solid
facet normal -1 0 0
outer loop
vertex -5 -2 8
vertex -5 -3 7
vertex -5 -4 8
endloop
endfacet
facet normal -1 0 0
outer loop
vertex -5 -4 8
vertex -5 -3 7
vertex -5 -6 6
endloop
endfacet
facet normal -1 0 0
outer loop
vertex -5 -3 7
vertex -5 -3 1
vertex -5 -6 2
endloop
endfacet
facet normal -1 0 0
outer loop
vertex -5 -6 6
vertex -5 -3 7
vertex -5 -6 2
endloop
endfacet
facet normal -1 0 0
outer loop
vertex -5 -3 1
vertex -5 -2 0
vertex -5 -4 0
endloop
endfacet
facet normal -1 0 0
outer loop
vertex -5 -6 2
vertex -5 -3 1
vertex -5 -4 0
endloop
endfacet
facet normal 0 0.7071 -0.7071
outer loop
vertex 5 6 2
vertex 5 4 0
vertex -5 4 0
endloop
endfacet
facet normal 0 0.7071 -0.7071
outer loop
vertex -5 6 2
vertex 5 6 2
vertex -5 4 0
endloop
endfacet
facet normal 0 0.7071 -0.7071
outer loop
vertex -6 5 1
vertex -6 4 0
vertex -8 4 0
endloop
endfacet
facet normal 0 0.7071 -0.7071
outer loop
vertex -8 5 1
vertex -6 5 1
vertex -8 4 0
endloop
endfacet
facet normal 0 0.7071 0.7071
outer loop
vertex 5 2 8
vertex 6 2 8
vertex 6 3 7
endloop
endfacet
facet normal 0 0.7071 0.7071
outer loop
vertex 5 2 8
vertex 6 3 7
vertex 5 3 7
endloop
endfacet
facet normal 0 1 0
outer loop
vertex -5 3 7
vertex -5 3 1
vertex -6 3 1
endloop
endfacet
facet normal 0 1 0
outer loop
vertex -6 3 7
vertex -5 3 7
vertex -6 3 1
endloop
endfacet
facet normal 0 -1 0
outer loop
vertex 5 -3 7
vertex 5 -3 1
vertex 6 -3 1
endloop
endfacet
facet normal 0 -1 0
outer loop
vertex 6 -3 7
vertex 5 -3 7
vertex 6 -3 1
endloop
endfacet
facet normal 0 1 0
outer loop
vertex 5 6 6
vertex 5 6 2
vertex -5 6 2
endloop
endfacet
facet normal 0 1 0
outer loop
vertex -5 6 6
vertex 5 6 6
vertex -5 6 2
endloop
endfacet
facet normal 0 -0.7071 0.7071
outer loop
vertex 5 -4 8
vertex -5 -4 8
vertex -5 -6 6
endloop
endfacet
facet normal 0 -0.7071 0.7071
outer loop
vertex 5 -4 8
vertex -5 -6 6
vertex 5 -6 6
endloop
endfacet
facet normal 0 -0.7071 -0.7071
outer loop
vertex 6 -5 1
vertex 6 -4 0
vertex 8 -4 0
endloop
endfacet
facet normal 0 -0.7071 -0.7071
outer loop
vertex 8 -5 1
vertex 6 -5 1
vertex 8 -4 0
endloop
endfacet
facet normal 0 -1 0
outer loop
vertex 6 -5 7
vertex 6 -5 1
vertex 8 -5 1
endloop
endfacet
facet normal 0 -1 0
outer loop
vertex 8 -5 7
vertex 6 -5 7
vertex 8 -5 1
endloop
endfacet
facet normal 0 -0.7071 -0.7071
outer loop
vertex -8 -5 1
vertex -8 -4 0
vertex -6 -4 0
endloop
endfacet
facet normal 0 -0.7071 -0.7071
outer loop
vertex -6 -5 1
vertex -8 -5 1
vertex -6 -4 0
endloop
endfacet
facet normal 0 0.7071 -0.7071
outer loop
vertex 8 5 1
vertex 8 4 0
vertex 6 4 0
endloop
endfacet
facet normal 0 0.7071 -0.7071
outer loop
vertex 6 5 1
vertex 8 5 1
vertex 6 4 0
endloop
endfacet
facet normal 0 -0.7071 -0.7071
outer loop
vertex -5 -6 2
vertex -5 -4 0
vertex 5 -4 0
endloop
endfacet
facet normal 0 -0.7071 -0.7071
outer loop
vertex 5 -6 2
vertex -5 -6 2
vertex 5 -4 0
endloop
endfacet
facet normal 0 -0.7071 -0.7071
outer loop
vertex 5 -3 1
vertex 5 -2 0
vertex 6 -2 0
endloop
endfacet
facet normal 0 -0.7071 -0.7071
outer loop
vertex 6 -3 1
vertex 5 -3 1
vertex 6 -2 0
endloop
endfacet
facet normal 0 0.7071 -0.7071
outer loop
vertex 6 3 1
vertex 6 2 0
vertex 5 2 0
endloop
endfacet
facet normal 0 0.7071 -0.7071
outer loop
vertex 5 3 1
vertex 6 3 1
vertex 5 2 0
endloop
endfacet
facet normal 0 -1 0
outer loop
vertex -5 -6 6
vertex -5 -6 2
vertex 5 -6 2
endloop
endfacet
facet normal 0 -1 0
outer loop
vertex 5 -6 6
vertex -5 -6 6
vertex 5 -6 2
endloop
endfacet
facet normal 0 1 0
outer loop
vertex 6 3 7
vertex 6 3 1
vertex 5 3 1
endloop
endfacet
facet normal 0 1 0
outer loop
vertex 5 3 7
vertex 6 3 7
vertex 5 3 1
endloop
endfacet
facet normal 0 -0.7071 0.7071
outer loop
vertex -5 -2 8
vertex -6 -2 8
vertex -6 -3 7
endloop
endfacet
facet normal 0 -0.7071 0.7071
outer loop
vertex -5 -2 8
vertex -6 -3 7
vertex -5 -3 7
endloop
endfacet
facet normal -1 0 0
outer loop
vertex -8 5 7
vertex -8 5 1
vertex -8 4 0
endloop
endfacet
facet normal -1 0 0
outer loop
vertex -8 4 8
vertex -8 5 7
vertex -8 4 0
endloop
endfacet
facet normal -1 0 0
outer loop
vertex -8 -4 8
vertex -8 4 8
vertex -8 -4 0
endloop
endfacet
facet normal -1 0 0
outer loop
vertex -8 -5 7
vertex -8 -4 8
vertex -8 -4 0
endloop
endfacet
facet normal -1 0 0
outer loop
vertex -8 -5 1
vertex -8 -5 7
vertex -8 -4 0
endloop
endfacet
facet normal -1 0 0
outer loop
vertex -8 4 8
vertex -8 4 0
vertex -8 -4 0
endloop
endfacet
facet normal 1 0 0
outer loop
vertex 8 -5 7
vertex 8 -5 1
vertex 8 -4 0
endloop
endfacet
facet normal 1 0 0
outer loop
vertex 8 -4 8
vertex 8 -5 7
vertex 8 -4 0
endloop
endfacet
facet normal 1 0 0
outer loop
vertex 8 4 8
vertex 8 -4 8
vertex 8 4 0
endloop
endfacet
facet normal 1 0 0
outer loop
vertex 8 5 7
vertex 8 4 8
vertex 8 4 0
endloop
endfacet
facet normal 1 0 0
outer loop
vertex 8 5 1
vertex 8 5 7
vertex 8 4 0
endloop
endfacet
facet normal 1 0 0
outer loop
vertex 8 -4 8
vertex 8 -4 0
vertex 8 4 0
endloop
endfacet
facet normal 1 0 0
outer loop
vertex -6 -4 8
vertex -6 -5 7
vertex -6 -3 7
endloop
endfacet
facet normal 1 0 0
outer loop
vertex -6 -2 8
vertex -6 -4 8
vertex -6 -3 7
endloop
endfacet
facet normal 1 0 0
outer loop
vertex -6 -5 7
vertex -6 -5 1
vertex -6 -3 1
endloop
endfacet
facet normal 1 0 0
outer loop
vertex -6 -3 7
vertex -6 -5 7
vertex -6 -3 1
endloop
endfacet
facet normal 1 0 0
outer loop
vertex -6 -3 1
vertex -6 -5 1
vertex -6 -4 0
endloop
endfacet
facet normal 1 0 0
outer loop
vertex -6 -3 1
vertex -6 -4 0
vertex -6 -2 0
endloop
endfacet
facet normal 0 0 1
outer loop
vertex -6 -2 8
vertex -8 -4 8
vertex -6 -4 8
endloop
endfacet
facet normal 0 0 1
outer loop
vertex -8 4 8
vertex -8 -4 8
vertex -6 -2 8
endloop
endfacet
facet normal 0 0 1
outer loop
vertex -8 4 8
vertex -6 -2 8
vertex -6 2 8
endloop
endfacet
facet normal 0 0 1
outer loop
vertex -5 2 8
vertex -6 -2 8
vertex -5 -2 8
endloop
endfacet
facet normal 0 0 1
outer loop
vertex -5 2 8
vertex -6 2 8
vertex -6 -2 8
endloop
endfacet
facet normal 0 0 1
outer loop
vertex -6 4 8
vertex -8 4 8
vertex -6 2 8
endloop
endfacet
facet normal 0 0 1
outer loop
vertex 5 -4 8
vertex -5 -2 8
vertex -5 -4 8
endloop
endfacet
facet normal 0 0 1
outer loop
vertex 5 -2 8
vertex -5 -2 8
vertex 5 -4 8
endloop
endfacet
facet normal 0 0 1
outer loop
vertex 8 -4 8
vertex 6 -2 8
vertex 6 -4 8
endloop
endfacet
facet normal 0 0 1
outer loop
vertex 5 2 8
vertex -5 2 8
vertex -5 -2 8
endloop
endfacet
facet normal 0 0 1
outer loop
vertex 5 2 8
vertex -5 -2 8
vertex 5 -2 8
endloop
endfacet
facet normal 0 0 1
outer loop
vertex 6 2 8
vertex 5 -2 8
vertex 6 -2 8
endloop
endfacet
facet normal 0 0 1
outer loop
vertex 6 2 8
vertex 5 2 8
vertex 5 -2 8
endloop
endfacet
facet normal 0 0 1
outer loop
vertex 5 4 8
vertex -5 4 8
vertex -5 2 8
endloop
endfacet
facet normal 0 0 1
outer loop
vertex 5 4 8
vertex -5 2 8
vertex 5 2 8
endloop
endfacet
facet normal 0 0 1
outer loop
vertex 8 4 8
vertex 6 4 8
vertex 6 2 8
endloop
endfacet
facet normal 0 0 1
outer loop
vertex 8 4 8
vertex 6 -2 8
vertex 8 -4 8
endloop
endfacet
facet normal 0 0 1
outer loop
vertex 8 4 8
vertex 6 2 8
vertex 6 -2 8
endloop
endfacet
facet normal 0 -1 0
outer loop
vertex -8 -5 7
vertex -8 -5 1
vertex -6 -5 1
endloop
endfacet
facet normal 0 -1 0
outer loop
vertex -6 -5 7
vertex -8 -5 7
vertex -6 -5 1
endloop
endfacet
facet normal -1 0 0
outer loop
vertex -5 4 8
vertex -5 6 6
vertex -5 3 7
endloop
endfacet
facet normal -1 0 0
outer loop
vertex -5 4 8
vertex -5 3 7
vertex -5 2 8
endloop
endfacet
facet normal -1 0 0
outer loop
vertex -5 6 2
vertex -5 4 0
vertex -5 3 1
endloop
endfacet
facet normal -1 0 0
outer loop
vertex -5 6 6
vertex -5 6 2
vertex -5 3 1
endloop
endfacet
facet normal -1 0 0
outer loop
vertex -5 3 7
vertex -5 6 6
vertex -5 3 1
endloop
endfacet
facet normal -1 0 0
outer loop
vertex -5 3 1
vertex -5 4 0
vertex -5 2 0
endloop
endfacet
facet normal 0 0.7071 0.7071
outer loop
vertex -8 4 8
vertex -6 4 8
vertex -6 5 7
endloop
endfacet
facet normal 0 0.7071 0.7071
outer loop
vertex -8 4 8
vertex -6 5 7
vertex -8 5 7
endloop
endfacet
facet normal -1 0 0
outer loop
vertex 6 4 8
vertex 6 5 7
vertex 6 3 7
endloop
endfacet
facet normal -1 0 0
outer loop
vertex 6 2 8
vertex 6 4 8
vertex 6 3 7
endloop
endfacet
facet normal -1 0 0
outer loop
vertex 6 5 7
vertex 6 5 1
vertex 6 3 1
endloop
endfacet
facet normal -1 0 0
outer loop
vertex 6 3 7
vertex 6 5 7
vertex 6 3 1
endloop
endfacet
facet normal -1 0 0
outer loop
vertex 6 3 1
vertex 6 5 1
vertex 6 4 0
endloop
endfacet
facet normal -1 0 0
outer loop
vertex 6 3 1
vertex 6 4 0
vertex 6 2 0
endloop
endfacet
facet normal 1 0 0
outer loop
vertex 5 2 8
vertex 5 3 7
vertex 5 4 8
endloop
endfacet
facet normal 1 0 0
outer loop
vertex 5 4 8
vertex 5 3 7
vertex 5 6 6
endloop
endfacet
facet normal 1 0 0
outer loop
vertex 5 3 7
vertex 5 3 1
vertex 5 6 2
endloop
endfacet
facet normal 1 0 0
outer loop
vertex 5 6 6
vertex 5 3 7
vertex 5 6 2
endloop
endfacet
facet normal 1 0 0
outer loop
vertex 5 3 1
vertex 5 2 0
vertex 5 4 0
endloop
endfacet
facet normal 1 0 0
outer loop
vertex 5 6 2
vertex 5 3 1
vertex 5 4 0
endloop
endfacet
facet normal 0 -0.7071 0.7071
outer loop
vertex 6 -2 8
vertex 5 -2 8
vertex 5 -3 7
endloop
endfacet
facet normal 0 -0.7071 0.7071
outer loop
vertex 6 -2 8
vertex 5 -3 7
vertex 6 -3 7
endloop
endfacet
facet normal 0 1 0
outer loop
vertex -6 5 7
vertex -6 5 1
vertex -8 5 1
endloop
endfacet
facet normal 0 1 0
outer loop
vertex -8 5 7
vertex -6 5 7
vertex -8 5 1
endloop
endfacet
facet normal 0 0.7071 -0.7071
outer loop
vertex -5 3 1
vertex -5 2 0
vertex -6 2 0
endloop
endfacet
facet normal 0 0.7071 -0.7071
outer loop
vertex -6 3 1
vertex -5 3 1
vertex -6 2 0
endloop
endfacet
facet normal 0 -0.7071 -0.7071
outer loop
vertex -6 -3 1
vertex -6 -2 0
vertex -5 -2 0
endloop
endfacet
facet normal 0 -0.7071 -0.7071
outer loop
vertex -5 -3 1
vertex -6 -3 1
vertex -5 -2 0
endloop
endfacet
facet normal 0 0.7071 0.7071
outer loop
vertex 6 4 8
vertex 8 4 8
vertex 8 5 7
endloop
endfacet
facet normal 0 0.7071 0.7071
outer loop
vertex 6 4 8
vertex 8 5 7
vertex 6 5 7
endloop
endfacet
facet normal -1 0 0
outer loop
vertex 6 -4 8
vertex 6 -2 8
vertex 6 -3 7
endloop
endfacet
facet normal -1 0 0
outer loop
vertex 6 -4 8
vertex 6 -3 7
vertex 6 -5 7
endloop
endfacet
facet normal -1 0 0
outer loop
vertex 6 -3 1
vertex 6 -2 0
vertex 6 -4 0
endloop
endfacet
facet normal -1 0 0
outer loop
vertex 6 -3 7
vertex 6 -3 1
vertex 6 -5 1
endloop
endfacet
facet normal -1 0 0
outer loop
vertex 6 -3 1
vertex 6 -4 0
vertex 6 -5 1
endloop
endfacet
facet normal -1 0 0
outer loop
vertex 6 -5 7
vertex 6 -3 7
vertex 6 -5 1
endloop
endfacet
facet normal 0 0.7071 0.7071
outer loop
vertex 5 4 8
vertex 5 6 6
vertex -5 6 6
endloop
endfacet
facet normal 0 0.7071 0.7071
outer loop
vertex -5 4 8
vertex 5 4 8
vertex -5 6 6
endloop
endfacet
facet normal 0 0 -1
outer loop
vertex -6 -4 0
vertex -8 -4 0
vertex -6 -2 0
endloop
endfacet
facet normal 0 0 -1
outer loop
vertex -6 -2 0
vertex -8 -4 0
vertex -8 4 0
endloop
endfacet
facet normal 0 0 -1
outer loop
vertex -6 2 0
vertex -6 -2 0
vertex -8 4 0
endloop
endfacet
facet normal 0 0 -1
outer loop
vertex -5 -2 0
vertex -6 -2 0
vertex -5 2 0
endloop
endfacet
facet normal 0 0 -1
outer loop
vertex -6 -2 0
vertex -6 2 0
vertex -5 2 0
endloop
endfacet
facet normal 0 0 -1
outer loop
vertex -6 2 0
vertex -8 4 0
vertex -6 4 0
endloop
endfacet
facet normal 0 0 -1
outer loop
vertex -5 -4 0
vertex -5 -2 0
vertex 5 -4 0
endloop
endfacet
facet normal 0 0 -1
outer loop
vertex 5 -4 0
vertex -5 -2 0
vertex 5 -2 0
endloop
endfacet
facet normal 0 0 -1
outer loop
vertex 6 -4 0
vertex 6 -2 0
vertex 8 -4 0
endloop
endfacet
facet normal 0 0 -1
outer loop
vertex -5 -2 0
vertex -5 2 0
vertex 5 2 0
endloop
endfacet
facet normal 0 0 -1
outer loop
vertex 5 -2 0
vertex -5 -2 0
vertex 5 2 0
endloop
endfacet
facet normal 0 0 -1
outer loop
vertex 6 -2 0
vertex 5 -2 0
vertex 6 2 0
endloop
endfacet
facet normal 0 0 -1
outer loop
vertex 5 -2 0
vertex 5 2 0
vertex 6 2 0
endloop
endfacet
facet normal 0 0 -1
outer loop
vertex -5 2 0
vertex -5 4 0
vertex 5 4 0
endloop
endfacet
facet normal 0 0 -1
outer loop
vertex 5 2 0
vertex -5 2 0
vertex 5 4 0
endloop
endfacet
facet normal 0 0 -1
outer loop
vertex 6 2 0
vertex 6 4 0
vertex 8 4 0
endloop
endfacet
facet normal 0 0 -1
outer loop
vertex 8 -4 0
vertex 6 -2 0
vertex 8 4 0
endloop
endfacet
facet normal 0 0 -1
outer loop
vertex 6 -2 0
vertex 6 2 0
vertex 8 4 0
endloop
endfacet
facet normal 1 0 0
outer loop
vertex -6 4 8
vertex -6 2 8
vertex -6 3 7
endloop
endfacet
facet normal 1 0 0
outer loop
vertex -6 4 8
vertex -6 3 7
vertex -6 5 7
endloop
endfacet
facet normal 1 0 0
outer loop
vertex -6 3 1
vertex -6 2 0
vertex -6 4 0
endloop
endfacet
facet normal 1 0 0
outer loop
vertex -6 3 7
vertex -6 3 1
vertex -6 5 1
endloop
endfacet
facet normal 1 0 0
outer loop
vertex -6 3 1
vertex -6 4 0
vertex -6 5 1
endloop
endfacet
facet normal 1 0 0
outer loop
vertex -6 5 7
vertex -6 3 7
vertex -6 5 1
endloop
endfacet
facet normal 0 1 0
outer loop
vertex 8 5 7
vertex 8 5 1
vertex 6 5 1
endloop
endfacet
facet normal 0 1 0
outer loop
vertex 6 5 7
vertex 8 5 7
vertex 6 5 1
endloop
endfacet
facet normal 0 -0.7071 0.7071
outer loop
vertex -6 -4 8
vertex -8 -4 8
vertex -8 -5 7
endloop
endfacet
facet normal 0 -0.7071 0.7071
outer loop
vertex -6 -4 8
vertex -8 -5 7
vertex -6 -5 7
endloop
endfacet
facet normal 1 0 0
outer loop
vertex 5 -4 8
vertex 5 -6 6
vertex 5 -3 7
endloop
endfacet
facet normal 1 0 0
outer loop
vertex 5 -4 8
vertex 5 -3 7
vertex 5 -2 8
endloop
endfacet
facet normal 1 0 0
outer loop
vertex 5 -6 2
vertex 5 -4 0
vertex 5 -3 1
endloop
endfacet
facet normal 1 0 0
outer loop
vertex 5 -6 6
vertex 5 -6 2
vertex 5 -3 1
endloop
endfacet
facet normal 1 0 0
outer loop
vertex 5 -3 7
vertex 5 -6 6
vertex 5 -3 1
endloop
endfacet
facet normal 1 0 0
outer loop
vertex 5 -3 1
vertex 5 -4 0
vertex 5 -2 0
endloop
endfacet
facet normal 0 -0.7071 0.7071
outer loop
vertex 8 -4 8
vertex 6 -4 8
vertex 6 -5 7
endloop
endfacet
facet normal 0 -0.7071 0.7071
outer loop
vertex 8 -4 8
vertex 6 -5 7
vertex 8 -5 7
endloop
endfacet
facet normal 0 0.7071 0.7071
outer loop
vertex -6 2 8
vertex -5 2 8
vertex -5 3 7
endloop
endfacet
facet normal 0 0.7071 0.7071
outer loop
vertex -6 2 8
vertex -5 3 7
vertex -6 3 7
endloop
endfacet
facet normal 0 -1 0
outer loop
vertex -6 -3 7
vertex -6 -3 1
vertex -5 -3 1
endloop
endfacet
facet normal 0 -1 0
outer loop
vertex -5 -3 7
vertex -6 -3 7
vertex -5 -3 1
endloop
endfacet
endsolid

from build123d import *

# Parameters (mm, degrees)
F1_DEPTH = 8
F2_SIZE  = 1
F3_SIZE  = 2


with BuildPart() as f1:
    # F0 (on Top) → F1 (new body)
    with BuildSketch(Plane.XY):
        Polygon((5, 6), (0, 6), (-5, 6), (-5, 3), (-6, 3), (-6, 5), (-8, 5), (-8, -5), (-6, -5), (-6, -3), (-5, -3), (-5, -6), (0, -6), (5, -6), (5, -3), (6, -3), (6, -5), (8, -5), (8, 5), (6, 5), (6, 3), (5, 3), align=None)
    extrude(amount=F1_DEPTH)

    # F2
    f2_edges = [f1.edges().sort_by_distance(p)[0] for p in [
        (-7, -5, 0),
        (-7, 5, 0),
        (7, -5, 0),
        (7, 5, 0),
        (-7, -5, 8),
        (-7, 5, 8),
        (7, -5, 8),
        (7, 5, 8),
        (5.5, -3, 8),
        (5.5, 3, 8),
        (-5.5, -3, 8),
        (-5.5, 3, 8),
        (-5.5, -3, 0),
        (-5.5, 3, 0),
        (5.5, 3, 0),
        (5.5, -3, 0),
    ]]
    chamfer(f2_edges, length=F2_SIZE)

    # F3
    f3_edges = [f1.edges().sort_by_distance(p)[0] for p in [
        (0, -6, 8),
        (0, -6, 0),
        (0, 6, 8),
        (0, 6, 0),
    ]]
    chamfer(f3_edges, length=F3_SIZE)


solid = f1.part
